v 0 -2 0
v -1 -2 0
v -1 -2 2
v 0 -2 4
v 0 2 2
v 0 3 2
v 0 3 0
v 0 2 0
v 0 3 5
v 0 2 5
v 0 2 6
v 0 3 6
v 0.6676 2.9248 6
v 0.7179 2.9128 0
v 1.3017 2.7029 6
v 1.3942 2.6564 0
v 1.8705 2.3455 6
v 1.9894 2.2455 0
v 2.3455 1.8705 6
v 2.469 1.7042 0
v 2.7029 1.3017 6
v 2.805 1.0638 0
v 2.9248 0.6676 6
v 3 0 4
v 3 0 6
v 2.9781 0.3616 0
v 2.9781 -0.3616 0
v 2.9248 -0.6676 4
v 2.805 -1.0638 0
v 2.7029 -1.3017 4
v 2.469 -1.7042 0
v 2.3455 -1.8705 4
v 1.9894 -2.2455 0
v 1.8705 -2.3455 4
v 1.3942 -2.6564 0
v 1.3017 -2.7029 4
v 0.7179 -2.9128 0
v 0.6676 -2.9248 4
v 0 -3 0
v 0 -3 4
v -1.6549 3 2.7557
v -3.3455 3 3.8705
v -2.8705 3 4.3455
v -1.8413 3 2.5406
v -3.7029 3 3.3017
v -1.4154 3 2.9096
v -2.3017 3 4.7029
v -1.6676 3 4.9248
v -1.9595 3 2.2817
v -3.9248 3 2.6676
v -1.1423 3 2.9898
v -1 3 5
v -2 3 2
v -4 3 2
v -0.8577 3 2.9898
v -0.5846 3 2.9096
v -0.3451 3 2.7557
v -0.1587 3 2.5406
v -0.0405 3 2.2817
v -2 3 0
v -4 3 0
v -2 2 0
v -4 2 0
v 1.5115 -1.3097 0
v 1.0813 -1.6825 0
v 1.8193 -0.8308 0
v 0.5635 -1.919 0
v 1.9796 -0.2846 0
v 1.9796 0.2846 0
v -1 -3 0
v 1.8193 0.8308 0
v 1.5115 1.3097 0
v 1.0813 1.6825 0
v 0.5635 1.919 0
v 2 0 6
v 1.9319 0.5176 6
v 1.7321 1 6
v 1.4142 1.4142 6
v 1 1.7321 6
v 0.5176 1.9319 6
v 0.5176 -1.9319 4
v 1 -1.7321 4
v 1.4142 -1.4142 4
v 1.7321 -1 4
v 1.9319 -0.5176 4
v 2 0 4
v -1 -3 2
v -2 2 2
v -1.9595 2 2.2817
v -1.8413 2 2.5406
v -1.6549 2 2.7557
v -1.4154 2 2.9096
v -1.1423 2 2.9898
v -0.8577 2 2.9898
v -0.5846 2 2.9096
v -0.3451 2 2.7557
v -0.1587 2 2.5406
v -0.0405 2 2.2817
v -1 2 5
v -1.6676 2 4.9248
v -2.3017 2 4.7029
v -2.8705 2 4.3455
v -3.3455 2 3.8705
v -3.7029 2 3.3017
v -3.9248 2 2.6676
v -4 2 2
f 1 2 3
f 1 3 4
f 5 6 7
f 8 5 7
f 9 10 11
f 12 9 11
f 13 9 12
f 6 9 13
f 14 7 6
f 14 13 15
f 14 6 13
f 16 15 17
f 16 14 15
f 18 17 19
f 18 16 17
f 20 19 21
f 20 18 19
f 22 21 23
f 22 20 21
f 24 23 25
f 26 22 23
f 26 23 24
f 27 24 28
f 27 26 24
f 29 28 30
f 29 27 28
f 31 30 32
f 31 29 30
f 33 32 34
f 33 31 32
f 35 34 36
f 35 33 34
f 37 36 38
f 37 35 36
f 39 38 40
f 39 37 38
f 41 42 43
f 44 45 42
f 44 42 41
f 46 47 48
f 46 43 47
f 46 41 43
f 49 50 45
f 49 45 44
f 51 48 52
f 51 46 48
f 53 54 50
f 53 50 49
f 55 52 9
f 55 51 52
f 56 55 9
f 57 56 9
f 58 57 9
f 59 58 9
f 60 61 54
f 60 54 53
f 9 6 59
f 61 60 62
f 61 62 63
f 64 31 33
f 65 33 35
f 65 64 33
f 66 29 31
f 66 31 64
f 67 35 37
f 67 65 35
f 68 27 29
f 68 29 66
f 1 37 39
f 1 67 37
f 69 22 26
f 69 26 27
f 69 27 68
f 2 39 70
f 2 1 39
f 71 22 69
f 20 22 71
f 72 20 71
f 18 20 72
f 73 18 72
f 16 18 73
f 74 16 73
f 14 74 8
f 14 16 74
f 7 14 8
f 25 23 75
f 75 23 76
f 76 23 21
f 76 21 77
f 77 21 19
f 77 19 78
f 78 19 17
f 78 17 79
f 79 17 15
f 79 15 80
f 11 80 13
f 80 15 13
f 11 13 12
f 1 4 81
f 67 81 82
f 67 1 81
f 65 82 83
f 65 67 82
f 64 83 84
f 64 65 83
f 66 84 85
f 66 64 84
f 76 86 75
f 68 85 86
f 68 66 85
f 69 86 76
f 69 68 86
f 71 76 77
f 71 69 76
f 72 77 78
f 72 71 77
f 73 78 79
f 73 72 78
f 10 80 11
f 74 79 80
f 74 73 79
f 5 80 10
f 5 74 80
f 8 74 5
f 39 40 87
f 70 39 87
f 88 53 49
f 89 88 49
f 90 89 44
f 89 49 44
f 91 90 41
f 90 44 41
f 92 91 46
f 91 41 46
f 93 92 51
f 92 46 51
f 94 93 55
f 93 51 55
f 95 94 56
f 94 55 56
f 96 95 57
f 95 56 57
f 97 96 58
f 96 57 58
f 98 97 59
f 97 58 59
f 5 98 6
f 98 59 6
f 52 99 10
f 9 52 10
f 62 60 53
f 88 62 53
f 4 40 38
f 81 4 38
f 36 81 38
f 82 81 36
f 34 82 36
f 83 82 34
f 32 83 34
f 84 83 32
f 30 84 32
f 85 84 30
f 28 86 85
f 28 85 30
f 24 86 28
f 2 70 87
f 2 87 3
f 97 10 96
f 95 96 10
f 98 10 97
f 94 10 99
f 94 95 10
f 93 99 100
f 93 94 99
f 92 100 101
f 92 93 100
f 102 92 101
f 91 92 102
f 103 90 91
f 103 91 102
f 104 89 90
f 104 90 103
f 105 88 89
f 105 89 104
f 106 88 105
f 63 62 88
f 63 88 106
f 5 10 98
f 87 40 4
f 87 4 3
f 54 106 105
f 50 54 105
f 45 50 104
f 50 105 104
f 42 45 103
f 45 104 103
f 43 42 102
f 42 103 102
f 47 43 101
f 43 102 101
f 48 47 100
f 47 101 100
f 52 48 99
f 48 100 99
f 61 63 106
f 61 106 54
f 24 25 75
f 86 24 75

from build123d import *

# Parameters (mm, degrees)
BOSS_EXTRUDE1_DEPTH = 6
CUT_EXTRUDE1_DEPTH  = 2
CUT_EXTRUDE2_DEPTH  = 2
CUT_EXTRUDE3_DEPTH  = 2
CUT_EXTRUDE4_DEPTH  = 3


with BuildPart() as part:
    # Sketch1 → Boss-Extrude1 (new body)
    with BuildSketch(Plane.XY):
        with BuildLine():
            Line((0, 2), (-4, 2))
            Line((-4, 2), (-4, 3))
            Line((-4, 3), (0, 3))
            ThreePointArc((0, 3), (3, 0), (0, -3))
            Line((0, -3), (-1, -3))
            Line((-1, -3), (-1, -2))
            Line((-1, -2), (0, -2))
            ThreePointArc((0, -2), (2, 0), (0, 2))
        make_face()
    extrude(amount=BOSS_EXTRUDE1_DEPTH)

    # Sketch2 → Cut-Extrude1 (cut)
    with BuildSketch(Plane.XY.offset(6)):
        with BuildLine():
            Line((3, 0), (2, 0))
            ThreePointArc((2, 0), (1.414213562, -1.414213562), (0, -2))
            Line((0, -2), (0, -3))
            ThreePointArc((0, -3), (2.121320344, -2.121320344), (3, 0))
        make_face()
    extrude(amount=-CUT_EXTRUDE1_DEPTH, mode=Mode.SUBTRACT)

    # Sketch3 → Cut-Extrude2 (cut)
    with BuildSketch(Plane.XZ.offset(3)):
        Polygon((0, 4), (-1, 2), (-1, 6), (0, 6), align=None)
    extrude(amount=-CUT_EXTRUDE2_DEPTH, mode=Mode.SUBTRACT)

    # Sketch4 → Cut-Extrude3 (cut)
    with BuildSketch(Plane.XZ.offset(-2)):
        with BuildLine():
            Line((-1, 5), (0, 5))
            Line((0, 5), (0, 6))
            Line((0, 6), (-4, 6))
            Line((-4, 6), (-4, 2))
            ThreePointArc((-4, 2), (-3.121320344, 4.121320344), (-1, 5))
        make_face()
    extrude(amount=-CUT_EXTRUDE3_DEPTH, mode=Mode.SUBTRACT)

    # Sketch5 → Cut-Extrude4 (cut)
    with BuildSketch(Plane(origin=(0, 3, 0), x_dir=(1, 0, 0), z_dir=(0, 1, 0))):
        with BuildLine():
            Line((-2, 0), (-2, -2))
            ThreePointArc((-2, -2), (-1, -3), (0, -2))
            Line((0, -2), (0, 0))
            Line((0, 0), (-2, 0))
        make_face()
    extrude(amount=-CUT_EXTRUDE4_DEPTH, mode=Mode.SUBTRACT)


solid = part.part
